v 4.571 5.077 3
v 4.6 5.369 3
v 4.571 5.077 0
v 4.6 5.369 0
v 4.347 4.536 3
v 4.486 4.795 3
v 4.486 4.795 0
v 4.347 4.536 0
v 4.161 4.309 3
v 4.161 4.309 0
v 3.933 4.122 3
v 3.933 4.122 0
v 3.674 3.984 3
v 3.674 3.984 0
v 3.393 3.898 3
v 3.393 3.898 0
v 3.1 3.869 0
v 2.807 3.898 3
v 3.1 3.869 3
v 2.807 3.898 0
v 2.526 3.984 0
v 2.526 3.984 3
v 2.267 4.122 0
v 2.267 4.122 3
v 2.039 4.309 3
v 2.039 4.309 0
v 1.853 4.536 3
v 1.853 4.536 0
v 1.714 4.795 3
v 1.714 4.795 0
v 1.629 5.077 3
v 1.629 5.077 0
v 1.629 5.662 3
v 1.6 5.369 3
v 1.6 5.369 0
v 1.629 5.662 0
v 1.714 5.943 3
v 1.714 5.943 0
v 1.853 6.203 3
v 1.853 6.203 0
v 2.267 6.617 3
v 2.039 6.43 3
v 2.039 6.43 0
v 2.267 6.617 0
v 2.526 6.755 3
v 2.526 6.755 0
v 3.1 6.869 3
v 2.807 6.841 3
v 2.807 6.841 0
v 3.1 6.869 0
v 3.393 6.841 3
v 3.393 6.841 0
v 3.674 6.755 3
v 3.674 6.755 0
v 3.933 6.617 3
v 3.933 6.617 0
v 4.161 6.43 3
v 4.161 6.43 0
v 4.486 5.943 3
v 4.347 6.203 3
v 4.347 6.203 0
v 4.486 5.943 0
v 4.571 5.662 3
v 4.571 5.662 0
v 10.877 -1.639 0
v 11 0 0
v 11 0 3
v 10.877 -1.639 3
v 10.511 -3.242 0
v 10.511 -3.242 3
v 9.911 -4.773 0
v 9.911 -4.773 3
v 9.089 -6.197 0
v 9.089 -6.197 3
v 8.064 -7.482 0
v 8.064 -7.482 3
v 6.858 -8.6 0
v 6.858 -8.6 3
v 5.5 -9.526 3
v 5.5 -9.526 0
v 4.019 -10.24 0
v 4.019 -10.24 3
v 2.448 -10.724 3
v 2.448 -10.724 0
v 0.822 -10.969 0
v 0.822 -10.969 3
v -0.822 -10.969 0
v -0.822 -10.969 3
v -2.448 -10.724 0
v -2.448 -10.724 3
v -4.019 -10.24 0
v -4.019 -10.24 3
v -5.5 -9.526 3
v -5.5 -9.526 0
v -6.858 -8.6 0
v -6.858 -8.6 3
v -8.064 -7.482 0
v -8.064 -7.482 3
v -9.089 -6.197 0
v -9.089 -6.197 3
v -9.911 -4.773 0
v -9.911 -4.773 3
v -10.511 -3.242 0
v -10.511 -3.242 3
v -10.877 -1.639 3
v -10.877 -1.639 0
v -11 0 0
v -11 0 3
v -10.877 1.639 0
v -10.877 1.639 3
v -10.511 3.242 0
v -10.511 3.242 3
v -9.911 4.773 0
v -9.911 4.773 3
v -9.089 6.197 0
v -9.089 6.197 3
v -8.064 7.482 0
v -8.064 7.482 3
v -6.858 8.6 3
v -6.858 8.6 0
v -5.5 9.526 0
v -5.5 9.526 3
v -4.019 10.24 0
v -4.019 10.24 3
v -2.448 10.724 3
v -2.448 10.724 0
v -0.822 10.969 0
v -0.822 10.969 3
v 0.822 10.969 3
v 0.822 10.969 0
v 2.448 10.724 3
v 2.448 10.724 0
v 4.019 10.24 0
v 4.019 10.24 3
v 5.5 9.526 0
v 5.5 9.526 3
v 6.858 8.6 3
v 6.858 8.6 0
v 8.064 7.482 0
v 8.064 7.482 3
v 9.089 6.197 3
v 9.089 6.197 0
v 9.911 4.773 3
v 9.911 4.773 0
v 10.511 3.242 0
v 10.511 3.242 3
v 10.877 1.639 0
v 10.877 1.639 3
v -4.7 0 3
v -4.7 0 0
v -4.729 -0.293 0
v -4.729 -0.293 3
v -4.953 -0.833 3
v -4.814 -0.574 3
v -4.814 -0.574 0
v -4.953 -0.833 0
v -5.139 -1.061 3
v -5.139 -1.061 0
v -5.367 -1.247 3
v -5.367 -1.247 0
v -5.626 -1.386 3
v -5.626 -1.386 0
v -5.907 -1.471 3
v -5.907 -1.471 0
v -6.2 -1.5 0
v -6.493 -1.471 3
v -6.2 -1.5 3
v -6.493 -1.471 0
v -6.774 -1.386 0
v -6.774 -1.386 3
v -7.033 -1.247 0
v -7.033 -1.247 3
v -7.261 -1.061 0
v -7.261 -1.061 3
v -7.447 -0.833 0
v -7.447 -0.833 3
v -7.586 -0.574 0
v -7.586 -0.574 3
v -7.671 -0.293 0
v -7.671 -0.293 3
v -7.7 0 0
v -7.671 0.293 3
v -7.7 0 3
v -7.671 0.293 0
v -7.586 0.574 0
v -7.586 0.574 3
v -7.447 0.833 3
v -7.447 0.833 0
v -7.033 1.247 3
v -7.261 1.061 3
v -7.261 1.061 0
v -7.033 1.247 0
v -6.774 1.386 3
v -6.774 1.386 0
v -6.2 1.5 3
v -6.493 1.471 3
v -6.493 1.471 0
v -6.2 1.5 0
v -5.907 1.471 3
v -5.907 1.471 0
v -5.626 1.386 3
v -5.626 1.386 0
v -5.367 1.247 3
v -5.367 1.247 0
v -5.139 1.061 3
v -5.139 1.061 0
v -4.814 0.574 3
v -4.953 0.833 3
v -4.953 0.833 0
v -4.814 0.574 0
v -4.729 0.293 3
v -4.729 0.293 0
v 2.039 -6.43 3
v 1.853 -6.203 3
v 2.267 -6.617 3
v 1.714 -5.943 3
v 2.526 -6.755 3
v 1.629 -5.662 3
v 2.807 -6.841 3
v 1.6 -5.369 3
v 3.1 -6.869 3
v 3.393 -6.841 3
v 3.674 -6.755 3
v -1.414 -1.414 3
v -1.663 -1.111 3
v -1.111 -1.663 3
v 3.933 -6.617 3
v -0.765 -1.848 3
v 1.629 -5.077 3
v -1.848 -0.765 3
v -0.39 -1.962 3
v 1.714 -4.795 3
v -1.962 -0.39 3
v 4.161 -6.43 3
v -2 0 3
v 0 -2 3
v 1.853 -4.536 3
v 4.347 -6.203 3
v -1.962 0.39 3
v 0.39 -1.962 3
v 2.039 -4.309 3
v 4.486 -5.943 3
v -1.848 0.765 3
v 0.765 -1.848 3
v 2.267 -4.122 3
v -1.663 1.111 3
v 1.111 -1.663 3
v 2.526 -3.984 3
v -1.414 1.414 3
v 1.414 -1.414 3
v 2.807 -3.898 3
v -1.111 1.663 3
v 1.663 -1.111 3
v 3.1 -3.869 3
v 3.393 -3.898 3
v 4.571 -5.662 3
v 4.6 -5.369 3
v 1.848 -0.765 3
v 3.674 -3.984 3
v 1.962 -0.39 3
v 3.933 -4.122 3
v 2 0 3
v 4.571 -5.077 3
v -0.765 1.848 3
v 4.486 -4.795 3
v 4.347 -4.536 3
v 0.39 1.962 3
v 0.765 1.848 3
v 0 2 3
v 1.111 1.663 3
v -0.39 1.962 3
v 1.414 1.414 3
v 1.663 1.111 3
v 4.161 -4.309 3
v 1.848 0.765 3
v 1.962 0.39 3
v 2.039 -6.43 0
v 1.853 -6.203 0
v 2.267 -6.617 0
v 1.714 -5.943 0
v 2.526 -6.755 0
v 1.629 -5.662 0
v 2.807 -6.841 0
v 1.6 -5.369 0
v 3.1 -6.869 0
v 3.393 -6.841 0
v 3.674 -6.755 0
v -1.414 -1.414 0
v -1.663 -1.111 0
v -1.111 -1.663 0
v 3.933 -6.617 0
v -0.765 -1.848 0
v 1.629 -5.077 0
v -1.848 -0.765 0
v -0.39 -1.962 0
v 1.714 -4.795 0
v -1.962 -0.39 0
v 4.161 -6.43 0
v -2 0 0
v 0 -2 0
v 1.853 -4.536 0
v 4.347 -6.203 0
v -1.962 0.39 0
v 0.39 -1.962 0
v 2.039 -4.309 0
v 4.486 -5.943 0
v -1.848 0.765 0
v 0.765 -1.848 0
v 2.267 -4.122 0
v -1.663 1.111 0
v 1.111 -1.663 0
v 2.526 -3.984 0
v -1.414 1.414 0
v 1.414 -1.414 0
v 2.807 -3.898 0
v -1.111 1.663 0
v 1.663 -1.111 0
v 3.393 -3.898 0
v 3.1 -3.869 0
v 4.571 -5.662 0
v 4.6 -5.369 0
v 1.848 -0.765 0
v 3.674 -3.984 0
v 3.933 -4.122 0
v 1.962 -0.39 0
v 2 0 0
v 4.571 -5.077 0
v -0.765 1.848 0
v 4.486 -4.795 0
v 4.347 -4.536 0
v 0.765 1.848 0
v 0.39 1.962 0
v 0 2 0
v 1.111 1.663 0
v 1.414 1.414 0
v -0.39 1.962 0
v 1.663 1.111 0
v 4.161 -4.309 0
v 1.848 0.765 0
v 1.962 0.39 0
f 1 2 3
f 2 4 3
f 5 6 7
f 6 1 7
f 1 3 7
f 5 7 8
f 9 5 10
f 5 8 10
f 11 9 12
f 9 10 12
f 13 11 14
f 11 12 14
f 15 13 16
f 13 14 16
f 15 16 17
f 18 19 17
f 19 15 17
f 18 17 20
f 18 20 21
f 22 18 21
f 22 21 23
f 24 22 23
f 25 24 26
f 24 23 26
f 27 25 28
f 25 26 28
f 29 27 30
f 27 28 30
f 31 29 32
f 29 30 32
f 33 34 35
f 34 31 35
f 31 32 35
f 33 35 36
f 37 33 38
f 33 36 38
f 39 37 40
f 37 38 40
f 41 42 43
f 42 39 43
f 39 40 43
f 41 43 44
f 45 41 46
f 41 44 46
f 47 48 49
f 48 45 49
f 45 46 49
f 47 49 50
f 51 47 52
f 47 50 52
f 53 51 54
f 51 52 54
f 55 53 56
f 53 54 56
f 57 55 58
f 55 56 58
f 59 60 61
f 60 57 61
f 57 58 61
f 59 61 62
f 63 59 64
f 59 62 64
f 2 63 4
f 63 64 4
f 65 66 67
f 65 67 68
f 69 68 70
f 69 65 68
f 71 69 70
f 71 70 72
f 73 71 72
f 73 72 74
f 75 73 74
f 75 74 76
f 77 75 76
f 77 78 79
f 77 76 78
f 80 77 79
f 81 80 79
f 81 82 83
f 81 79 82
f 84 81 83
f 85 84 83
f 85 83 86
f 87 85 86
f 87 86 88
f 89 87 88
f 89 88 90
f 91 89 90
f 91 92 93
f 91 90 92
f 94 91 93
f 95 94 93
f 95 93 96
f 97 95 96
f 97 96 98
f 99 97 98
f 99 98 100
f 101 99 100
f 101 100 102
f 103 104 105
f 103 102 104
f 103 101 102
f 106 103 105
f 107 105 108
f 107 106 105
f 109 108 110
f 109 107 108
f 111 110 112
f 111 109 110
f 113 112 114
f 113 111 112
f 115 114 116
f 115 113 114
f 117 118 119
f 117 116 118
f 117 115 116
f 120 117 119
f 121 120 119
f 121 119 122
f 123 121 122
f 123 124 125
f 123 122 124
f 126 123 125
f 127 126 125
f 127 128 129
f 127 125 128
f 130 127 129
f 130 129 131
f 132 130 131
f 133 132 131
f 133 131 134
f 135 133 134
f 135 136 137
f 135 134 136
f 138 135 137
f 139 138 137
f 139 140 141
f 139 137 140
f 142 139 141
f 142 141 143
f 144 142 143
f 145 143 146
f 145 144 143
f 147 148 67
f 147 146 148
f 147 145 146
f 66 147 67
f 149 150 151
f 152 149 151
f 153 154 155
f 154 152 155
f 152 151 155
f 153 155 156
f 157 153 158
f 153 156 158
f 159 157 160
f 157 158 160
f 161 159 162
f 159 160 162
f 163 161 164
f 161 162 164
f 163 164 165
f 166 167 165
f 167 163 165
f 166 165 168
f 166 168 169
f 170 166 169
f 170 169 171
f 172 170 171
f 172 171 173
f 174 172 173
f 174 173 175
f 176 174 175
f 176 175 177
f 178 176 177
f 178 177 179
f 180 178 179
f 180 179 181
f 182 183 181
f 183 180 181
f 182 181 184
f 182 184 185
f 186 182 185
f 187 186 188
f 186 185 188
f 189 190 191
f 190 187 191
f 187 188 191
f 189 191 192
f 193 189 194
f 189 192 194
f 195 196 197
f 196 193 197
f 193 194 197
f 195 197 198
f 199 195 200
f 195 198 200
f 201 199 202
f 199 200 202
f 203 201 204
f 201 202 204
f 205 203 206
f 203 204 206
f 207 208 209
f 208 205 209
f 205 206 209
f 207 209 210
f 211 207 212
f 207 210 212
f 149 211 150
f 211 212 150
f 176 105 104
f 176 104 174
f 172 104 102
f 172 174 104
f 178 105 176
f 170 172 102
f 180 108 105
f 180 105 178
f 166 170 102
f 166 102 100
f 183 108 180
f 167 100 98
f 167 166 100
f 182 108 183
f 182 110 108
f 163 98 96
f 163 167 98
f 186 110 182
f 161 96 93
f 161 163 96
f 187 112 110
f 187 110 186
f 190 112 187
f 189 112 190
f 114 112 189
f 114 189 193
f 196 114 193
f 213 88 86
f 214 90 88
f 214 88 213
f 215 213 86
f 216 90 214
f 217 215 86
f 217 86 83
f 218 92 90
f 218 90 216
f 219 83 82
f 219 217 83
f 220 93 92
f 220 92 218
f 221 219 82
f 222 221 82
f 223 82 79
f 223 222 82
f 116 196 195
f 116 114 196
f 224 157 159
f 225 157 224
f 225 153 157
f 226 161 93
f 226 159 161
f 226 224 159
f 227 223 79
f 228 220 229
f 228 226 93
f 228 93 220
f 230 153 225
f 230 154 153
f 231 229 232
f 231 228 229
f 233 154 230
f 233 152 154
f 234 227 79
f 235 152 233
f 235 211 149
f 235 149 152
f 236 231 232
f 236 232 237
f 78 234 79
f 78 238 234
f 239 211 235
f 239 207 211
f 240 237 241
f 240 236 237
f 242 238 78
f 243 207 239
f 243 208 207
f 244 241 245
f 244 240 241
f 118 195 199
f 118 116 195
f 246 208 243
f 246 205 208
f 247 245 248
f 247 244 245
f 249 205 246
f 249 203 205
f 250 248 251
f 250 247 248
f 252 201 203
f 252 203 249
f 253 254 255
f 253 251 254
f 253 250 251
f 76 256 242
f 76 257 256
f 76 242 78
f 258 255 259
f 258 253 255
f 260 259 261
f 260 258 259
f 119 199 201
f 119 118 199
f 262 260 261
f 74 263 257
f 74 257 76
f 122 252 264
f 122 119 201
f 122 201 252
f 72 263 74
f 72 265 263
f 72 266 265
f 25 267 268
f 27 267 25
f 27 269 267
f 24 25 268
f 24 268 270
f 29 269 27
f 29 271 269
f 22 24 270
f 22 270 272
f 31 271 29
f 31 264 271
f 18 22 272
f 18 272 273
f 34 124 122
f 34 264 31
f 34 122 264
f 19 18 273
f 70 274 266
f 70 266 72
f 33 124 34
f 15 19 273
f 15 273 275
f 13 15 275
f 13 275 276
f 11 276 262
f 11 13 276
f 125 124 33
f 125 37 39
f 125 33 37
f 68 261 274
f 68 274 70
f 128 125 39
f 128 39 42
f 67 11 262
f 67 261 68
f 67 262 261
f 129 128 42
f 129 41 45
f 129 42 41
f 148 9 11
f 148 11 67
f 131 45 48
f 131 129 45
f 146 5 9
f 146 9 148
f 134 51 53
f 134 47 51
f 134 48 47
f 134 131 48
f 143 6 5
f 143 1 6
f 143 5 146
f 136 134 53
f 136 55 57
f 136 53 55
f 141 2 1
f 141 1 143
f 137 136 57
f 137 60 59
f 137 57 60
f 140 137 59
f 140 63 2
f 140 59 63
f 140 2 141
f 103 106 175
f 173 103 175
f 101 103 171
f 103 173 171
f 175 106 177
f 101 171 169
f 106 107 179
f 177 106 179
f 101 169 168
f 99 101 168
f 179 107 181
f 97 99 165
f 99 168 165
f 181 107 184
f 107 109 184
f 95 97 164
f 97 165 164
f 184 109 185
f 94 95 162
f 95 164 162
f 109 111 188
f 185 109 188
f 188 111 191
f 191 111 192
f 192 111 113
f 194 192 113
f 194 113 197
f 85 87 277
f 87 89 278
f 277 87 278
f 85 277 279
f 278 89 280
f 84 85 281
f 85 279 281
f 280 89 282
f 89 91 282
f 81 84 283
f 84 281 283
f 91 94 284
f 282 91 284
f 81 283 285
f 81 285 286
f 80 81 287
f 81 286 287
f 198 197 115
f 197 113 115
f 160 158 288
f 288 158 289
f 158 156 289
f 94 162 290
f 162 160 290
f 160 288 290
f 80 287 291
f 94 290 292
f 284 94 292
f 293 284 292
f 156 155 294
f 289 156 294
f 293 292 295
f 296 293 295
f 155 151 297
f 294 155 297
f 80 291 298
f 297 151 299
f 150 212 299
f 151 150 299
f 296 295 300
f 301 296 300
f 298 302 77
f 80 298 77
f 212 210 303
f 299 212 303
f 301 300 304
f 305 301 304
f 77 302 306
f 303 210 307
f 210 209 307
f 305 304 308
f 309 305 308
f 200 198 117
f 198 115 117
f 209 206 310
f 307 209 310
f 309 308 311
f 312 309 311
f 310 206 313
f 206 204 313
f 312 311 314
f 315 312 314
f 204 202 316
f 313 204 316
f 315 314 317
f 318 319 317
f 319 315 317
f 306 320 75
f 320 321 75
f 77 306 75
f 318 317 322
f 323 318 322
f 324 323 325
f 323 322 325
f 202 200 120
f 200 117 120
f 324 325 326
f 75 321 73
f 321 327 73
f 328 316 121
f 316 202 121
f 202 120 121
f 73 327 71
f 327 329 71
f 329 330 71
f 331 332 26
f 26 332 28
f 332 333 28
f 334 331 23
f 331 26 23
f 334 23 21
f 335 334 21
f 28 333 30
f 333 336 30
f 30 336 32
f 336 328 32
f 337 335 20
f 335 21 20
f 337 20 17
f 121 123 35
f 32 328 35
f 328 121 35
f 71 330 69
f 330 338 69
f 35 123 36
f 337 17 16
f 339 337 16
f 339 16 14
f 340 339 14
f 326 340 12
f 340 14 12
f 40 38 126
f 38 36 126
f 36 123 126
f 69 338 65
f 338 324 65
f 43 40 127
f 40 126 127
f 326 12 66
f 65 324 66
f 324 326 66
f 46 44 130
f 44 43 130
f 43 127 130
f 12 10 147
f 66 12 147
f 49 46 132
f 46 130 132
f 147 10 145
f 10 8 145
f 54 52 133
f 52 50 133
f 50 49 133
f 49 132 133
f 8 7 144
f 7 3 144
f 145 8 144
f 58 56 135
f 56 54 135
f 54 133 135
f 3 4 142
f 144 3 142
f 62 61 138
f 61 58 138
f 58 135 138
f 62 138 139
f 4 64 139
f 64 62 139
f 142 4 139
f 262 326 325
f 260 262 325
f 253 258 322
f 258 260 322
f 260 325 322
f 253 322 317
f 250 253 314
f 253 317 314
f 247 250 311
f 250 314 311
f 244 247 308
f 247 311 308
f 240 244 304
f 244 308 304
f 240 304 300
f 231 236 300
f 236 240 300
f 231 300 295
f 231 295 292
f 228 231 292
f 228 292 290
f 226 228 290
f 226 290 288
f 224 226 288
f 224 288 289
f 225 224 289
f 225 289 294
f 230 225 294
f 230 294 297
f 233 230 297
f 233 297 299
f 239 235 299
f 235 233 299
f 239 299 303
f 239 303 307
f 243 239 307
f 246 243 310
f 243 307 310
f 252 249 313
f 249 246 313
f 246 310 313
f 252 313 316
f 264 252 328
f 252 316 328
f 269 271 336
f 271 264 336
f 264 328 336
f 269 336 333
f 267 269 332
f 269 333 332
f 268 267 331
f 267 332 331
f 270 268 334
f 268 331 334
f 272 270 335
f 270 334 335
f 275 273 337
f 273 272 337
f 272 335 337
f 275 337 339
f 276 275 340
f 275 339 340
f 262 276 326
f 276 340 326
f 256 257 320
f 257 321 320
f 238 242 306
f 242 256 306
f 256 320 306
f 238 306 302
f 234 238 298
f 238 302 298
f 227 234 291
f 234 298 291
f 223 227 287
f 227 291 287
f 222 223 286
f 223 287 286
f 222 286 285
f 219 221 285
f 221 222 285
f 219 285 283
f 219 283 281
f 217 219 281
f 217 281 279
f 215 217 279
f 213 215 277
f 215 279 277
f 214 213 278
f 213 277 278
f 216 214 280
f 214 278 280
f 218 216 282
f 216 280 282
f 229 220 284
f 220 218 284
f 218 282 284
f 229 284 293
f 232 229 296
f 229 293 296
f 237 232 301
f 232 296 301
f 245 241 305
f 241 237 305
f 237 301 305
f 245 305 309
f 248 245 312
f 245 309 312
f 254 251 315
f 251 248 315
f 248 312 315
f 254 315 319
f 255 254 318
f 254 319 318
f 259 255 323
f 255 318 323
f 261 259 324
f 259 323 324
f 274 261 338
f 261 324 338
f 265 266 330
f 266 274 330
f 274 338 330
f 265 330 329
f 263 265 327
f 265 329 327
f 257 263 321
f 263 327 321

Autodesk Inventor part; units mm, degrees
ref_plane "YZ Plane" through (0, 0, 0) normal (1, 0, 0) x (0, 1, 0)
ref_plane "XZ Plane" through (0, 0, 0) normal (0, 1, 0) x (-1, 0, 0)
ref_plane "XY Plane" through (0, 0, 0) normal (0, 0, 1) x (1, 0, 0)
sketch "Sketch1" plane through (0, 0, 0) normal (0, 0, 1) x (1, 0, 0)
  point P0 (0, 0)
sketch "Sketch2" plane through (0, 0, 0) normal (0, 0, 1) x (1, 0, 0)
  circle A0 centre (0, 0) radius 11
  circle A1 centre (0, 0) radius 2
  circle A2 centre (-6.2, 0) radius 1.5
  circle A3 centre (0, 0) radius 6.2 construction
  circle A4 centre (3.1, -5.3694) radius 1.5
  circle A5 centre (3.1, 5.3694) radius 1.5
  dimension "d3" = 12.4
  dimension "d0" = 22
  dimension "d1" = 4
  dimension "d2" = 3
  dimension "d6" = 360
extrude "Extrusion1" add sketch "Sketch2" along normal blind 3
properties part number "WheelAdapter-4mm-2" material "Aluminum 6061"
